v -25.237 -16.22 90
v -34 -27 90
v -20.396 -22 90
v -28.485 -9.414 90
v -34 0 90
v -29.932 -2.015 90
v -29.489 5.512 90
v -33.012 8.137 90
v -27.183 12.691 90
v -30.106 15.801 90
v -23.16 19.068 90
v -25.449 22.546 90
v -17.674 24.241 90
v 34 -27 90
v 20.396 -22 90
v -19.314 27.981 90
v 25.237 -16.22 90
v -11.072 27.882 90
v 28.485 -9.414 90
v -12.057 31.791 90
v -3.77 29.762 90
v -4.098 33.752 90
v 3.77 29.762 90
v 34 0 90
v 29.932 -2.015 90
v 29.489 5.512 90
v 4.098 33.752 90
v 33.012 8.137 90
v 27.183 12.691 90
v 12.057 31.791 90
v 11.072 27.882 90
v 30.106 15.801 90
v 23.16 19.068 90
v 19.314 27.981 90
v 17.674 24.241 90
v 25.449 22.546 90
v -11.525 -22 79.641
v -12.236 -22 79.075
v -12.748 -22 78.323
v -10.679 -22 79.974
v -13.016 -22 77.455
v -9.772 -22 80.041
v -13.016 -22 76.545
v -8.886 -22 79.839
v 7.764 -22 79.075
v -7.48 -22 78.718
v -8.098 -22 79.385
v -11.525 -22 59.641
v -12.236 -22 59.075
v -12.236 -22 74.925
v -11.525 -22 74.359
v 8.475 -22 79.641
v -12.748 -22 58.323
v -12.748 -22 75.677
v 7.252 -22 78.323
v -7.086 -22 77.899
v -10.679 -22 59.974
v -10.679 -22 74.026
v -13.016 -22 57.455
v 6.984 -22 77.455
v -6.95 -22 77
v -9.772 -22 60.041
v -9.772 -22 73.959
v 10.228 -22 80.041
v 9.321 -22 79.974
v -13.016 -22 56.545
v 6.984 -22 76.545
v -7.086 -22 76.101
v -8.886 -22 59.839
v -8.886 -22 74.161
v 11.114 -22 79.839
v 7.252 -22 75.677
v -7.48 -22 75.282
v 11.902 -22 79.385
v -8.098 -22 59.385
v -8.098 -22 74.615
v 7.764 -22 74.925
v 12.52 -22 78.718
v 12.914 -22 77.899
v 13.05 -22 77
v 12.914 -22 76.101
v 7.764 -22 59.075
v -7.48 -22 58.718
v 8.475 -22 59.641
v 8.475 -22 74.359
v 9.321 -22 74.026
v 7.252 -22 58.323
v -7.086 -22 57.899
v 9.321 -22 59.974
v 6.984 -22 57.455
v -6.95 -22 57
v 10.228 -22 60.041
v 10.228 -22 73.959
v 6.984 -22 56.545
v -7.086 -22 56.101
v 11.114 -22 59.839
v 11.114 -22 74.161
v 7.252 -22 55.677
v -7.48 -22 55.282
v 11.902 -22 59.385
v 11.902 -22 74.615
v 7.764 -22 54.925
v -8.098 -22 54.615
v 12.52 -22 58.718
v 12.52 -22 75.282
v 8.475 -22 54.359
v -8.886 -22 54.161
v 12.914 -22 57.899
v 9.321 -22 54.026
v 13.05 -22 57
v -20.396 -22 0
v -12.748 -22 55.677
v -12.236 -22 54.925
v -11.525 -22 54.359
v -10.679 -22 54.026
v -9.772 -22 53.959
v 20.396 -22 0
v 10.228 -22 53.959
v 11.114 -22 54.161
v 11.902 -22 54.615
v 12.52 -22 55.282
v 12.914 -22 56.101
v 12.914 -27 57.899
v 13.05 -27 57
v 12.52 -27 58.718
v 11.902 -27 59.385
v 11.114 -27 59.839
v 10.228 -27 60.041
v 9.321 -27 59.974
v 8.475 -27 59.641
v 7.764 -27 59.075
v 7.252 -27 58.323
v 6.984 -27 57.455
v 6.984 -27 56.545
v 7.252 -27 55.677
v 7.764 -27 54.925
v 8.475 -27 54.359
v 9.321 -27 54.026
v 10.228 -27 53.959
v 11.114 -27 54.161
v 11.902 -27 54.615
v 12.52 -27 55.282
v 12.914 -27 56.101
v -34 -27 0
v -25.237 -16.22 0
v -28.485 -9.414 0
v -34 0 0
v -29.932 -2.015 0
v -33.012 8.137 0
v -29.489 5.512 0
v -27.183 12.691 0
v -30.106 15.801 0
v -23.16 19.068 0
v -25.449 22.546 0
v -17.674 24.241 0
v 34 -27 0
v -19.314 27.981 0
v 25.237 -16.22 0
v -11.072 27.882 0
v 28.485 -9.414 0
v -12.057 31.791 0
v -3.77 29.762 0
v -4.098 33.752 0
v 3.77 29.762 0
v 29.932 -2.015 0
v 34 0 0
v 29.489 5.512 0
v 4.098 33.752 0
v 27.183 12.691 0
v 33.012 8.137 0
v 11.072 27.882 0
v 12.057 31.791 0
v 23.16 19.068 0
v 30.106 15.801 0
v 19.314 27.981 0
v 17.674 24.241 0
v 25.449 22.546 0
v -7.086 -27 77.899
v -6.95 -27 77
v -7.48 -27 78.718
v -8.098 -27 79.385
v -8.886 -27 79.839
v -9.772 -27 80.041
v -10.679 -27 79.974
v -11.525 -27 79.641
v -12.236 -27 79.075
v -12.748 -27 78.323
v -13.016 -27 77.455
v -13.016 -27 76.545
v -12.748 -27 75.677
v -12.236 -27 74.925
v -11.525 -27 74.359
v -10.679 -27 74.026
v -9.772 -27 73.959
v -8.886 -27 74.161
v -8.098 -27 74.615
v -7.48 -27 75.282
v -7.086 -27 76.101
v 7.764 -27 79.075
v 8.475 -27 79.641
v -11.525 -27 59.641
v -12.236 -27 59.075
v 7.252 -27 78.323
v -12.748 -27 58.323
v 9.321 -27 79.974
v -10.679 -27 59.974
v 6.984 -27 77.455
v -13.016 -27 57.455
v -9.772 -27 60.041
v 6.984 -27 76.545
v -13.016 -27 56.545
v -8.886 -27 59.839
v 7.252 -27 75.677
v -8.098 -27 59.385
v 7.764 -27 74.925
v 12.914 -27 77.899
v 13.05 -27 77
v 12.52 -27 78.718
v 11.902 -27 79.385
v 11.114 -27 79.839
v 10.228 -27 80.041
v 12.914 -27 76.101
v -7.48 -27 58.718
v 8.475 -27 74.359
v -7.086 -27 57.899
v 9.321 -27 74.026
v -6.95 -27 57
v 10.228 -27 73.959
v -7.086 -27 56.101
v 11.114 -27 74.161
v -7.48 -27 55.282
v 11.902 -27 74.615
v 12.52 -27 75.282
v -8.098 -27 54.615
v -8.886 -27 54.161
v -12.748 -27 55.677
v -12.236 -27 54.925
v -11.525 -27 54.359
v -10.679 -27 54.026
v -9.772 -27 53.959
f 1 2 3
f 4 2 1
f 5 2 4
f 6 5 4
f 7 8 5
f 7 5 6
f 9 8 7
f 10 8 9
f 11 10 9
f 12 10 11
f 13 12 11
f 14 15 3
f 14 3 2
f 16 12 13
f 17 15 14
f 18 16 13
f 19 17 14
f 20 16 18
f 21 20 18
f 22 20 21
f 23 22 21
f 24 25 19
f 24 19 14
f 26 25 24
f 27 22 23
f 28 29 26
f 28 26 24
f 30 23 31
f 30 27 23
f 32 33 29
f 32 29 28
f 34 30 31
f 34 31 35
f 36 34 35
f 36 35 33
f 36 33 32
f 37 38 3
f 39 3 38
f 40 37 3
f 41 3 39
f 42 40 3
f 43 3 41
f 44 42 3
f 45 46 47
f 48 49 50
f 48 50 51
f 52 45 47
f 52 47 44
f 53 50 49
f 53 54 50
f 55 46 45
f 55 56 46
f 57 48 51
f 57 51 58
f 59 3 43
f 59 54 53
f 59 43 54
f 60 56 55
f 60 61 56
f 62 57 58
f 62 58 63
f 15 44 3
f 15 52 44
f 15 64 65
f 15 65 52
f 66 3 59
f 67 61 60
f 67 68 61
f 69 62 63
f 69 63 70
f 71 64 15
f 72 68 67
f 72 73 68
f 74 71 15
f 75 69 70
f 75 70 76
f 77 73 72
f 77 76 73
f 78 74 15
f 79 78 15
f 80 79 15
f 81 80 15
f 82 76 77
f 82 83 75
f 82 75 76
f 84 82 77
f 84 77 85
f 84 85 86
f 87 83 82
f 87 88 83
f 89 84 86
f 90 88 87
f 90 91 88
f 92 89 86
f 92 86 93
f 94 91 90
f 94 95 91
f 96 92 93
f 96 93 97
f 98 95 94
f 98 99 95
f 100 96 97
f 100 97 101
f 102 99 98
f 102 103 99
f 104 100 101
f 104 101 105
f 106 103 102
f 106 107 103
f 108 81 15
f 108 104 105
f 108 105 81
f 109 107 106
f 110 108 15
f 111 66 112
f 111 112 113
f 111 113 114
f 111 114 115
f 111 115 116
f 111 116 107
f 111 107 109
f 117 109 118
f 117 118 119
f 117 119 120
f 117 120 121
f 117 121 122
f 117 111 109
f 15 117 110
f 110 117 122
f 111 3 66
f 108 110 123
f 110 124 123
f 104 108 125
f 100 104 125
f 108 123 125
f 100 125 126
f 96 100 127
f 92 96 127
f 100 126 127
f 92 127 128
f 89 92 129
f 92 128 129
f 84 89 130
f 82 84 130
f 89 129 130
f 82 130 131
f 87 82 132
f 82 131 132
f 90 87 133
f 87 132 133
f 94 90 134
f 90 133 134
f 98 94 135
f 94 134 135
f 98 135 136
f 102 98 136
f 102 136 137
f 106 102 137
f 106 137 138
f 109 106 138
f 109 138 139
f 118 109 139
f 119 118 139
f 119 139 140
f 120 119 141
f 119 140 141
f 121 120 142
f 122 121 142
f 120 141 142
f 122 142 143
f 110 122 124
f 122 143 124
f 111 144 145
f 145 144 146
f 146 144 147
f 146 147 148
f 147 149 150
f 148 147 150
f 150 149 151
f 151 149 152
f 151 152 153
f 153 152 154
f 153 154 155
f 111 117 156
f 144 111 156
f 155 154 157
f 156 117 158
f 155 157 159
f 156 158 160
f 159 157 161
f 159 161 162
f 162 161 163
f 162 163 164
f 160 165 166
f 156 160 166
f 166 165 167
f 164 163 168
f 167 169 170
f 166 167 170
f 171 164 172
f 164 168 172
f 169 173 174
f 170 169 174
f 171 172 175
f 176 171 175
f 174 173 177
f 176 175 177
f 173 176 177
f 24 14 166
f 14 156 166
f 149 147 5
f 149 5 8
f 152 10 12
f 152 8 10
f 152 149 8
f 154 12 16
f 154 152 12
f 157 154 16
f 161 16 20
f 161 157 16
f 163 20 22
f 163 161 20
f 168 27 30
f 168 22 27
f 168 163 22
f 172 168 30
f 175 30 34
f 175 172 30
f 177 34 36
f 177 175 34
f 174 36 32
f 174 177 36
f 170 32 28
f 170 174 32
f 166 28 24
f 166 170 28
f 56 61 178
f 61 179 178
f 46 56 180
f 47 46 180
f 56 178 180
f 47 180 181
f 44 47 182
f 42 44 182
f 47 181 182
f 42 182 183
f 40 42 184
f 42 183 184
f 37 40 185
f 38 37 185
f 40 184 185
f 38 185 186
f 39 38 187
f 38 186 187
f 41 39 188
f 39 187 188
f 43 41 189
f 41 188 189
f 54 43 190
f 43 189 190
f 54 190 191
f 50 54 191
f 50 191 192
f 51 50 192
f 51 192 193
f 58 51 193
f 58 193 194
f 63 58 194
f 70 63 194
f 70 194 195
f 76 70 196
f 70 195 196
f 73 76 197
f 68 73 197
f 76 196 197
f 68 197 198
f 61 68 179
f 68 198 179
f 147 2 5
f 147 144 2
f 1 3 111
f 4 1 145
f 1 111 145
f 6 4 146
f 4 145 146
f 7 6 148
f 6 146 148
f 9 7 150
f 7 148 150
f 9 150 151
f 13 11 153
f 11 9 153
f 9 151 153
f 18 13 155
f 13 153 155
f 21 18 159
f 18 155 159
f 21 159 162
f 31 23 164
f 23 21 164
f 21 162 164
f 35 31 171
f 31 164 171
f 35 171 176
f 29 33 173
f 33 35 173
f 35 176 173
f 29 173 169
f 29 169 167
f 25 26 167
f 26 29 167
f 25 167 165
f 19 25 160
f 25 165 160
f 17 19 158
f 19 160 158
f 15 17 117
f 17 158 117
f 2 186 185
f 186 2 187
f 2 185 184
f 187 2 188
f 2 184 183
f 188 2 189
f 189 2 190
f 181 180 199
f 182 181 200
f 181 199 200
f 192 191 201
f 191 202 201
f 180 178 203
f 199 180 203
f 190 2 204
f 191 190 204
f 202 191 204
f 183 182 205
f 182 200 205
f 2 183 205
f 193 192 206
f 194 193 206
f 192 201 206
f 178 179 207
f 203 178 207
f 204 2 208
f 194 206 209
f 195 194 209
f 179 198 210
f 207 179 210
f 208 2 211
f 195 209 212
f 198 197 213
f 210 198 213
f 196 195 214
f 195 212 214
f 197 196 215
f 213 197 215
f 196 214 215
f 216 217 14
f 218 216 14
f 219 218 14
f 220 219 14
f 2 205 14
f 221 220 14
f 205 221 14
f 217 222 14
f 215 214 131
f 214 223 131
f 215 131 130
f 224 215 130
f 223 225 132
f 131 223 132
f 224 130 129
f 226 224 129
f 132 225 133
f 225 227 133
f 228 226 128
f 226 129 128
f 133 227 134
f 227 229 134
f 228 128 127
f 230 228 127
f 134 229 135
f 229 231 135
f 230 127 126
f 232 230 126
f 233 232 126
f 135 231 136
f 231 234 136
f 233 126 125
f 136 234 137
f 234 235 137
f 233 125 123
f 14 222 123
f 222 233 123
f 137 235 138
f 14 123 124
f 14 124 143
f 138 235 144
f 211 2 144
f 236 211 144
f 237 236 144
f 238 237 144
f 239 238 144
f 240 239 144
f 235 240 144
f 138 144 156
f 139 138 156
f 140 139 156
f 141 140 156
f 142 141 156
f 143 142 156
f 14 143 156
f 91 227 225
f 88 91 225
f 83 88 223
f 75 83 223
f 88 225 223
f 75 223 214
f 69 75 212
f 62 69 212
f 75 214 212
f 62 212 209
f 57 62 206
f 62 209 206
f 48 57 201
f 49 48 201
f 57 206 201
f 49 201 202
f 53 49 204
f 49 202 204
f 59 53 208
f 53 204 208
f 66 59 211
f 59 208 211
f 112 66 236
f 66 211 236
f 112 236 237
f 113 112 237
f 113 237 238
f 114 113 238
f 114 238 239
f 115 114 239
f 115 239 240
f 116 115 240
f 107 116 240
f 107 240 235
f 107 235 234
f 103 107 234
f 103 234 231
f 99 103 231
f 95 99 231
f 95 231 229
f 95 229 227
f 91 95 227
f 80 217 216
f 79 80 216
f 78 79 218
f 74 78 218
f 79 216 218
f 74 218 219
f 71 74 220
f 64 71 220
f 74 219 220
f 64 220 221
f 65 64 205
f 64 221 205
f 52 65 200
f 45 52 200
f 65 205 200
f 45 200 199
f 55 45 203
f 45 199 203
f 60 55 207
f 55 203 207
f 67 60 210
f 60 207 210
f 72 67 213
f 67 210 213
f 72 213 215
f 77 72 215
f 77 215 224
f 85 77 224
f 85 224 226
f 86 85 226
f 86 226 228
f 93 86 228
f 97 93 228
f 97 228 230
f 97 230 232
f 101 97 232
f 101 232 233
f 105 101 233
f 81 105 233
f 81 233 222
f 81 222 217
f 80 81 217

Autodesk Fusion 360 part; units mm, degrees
sketch "Sketch1" plane through (0, 0, 0) normal (0, 0, 1) x (1, 0, 0)
  circle A0 centre (0, 0) radius 30
  circle A1 centre (0, 0) radius 34
  line L0 (0, 30) -> (0, -22) construction
  line L1 (-20.3961, -22) -> (20.3961, -22)
  line L2 (-34, -27) -> (34, -27)
  line L3 (-34, -27) -> (-34, 0)
  line L4 (34, -27) -> (34, 0)
  circle A2 centre (0, 4) radius 25.4 construction
  dimension "d1" = 60
  dimension "d2" = 68
  dimension "d3" = 52
  dimension "d6" = 5
  dimension "d38" = 50.8
extrude "Extrude1" add sketch "Sketch1" along normal blind 90 contours A0 A1 L2 | A0 L1 L2 | A1 L2 L3 | A1 L2 L4 picked at (-32.5234, 2.2674)
sketch "Sketch8" plane through (0, -27, 0) normal (0, -1, 0) x (1, 0, 0)
  line L0 (-34, 0) -> (34, 0)
  line L1 (34, 0) -> (34, 90)
  line L2 (34, 90) -> (-34, 90)
  line L3 (-34, 90) -> (-34, 0)
  circle A0 centre (-10, 77) radius 3.05
  circle A1 centre (10, 77) radius 3.05
  circle A2 centre (-10, 57) radius 3.05
  circle A3 centre (10, 57) radius 3.05
  dimension "d43" = 6.1
  dimension "d44" = 6.1
  dimension "d45" = 6.1
  dimension "d46" = 6.1
  dimension "d47" = 13
  dimension "d48" = 13
  dimension "d49" = 33
  dimension "d50" = 33
  dimension "d51" = 20
  dimension "d52" = 20
  dimension "d53" = 24
  dimension "d54" = 24
extrude "Extrude10" cut sketch "Sketch8" against normal blind 5 contours A0 | A1 | A2 | A3
equation "d44 = d43"
equation "d45 = d43"
equation "d46 = d43"
equation "d48 = d47"
equation "d50 = d49"
equation "d52 = d51"
equation "d54 = d53"
